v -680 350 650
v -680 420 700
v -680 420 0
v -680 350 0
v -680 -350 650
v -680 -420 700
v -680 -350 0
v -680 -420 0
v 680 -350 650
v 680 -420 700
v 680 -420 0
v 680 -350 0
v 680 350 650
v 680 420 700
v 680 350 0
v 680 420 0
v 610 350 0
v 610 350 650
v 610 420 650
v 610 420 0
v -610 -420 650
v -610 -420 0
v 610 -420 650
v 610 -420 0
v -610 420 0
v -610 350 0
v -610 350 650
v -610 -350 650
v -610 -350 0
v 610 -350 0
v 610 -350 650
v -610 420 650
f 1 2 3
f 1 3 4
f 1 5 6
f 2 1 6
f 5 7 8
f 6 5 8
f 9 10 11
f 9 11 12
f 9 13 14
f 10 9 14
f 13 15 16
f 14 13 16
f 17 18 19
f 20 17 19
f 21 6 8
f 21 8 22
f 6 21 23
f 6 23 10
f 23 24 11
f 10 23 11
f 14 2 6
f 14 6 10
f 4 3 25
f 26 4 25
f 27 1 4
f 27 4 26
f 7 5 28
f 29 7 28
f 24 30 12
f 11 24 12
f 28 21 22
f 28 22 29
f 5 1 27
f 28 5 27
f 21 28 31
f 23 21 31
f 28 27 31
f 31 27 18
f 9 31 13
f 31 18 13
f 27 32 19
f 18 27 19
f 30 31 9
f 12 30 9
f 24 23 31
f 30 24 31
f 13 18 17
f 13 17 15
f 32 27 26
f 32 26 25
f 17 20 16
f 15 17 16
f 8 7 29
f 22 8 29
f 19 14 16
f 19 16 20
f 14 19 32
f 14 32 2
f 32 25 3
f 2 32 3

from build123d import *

# Parameters (mm, degrees)
F0_W     = 70
F0_H     = 70
F1_DEPTH = 650
F2_START = 650
F2_DEPTH = 50


with BuildPart() as f1:
    # F0 (on Top) → F1 (new body)
    with BuildSketch(Plane.XY):
        with Locations((-645, 385)):
            Rectangle(F0_W, F0_H)
    extrude(amount=F1_DEPTH)



with BuildPart() as f1b:
    # F0 (on Top) → F1, piece 2 (new body)
    with BuildSketch(Plane.XY):
        with Locations((645, 385)):
            Rectangle(F0_W, F0_H)
    extrude(amount=F1_DEPTH)


with BuildPart() as f1c:
    # F0 (on Top) → F1, piece 3 (new body)
    with BuildSketch(Plane.XY):
        with Locations((645, -385)):
            Rectangle(F0_W, F0_H)
    extrude(amount=F1_DEPTH)


with BuildPart() as f1d:
    # F0 (on Top) → F1, piece 4 (new body)
    with BuildSketch(Plane.XY):
        with Locations((-645, -385)):
            Rectangle(F0_W, F0_H)
    extrude(amount=F1_DEPTH)


with BuildPart() as f1_1:
    add(f1.part)

    add(f1b.part)  # F2 merges F1b

    add(f1c.part)  # F2 merges F1c

    add(f1d.part)  # F2 merges F1d
    # F0 (on Top) → F2 (join)
    with BuildSketch(Plane.XY.offset(F2_START)):
        with Locations((-645, 385)):
            Rectangle(F0_W, F0_H)
        Polygon((610, 420), (-610, 420), (-610, 350), (-680, 350), (-680, -350), (-610, -350), (-610, -420), (610, -420), (610, -350), (680, -350), (680, 350), (610, 350), align=None)
        with Locations((-645, -385)):
            Rectangle(F0_W, F0_H)
        with Locations((645, 385)):
            Rectangle(F0_W, F0_H)
        with Locations((645, -385)):
            Rectangle(F0_W, F0_H)
    extrude(amount=F2_DEPTH)


solid = f1_1.part
